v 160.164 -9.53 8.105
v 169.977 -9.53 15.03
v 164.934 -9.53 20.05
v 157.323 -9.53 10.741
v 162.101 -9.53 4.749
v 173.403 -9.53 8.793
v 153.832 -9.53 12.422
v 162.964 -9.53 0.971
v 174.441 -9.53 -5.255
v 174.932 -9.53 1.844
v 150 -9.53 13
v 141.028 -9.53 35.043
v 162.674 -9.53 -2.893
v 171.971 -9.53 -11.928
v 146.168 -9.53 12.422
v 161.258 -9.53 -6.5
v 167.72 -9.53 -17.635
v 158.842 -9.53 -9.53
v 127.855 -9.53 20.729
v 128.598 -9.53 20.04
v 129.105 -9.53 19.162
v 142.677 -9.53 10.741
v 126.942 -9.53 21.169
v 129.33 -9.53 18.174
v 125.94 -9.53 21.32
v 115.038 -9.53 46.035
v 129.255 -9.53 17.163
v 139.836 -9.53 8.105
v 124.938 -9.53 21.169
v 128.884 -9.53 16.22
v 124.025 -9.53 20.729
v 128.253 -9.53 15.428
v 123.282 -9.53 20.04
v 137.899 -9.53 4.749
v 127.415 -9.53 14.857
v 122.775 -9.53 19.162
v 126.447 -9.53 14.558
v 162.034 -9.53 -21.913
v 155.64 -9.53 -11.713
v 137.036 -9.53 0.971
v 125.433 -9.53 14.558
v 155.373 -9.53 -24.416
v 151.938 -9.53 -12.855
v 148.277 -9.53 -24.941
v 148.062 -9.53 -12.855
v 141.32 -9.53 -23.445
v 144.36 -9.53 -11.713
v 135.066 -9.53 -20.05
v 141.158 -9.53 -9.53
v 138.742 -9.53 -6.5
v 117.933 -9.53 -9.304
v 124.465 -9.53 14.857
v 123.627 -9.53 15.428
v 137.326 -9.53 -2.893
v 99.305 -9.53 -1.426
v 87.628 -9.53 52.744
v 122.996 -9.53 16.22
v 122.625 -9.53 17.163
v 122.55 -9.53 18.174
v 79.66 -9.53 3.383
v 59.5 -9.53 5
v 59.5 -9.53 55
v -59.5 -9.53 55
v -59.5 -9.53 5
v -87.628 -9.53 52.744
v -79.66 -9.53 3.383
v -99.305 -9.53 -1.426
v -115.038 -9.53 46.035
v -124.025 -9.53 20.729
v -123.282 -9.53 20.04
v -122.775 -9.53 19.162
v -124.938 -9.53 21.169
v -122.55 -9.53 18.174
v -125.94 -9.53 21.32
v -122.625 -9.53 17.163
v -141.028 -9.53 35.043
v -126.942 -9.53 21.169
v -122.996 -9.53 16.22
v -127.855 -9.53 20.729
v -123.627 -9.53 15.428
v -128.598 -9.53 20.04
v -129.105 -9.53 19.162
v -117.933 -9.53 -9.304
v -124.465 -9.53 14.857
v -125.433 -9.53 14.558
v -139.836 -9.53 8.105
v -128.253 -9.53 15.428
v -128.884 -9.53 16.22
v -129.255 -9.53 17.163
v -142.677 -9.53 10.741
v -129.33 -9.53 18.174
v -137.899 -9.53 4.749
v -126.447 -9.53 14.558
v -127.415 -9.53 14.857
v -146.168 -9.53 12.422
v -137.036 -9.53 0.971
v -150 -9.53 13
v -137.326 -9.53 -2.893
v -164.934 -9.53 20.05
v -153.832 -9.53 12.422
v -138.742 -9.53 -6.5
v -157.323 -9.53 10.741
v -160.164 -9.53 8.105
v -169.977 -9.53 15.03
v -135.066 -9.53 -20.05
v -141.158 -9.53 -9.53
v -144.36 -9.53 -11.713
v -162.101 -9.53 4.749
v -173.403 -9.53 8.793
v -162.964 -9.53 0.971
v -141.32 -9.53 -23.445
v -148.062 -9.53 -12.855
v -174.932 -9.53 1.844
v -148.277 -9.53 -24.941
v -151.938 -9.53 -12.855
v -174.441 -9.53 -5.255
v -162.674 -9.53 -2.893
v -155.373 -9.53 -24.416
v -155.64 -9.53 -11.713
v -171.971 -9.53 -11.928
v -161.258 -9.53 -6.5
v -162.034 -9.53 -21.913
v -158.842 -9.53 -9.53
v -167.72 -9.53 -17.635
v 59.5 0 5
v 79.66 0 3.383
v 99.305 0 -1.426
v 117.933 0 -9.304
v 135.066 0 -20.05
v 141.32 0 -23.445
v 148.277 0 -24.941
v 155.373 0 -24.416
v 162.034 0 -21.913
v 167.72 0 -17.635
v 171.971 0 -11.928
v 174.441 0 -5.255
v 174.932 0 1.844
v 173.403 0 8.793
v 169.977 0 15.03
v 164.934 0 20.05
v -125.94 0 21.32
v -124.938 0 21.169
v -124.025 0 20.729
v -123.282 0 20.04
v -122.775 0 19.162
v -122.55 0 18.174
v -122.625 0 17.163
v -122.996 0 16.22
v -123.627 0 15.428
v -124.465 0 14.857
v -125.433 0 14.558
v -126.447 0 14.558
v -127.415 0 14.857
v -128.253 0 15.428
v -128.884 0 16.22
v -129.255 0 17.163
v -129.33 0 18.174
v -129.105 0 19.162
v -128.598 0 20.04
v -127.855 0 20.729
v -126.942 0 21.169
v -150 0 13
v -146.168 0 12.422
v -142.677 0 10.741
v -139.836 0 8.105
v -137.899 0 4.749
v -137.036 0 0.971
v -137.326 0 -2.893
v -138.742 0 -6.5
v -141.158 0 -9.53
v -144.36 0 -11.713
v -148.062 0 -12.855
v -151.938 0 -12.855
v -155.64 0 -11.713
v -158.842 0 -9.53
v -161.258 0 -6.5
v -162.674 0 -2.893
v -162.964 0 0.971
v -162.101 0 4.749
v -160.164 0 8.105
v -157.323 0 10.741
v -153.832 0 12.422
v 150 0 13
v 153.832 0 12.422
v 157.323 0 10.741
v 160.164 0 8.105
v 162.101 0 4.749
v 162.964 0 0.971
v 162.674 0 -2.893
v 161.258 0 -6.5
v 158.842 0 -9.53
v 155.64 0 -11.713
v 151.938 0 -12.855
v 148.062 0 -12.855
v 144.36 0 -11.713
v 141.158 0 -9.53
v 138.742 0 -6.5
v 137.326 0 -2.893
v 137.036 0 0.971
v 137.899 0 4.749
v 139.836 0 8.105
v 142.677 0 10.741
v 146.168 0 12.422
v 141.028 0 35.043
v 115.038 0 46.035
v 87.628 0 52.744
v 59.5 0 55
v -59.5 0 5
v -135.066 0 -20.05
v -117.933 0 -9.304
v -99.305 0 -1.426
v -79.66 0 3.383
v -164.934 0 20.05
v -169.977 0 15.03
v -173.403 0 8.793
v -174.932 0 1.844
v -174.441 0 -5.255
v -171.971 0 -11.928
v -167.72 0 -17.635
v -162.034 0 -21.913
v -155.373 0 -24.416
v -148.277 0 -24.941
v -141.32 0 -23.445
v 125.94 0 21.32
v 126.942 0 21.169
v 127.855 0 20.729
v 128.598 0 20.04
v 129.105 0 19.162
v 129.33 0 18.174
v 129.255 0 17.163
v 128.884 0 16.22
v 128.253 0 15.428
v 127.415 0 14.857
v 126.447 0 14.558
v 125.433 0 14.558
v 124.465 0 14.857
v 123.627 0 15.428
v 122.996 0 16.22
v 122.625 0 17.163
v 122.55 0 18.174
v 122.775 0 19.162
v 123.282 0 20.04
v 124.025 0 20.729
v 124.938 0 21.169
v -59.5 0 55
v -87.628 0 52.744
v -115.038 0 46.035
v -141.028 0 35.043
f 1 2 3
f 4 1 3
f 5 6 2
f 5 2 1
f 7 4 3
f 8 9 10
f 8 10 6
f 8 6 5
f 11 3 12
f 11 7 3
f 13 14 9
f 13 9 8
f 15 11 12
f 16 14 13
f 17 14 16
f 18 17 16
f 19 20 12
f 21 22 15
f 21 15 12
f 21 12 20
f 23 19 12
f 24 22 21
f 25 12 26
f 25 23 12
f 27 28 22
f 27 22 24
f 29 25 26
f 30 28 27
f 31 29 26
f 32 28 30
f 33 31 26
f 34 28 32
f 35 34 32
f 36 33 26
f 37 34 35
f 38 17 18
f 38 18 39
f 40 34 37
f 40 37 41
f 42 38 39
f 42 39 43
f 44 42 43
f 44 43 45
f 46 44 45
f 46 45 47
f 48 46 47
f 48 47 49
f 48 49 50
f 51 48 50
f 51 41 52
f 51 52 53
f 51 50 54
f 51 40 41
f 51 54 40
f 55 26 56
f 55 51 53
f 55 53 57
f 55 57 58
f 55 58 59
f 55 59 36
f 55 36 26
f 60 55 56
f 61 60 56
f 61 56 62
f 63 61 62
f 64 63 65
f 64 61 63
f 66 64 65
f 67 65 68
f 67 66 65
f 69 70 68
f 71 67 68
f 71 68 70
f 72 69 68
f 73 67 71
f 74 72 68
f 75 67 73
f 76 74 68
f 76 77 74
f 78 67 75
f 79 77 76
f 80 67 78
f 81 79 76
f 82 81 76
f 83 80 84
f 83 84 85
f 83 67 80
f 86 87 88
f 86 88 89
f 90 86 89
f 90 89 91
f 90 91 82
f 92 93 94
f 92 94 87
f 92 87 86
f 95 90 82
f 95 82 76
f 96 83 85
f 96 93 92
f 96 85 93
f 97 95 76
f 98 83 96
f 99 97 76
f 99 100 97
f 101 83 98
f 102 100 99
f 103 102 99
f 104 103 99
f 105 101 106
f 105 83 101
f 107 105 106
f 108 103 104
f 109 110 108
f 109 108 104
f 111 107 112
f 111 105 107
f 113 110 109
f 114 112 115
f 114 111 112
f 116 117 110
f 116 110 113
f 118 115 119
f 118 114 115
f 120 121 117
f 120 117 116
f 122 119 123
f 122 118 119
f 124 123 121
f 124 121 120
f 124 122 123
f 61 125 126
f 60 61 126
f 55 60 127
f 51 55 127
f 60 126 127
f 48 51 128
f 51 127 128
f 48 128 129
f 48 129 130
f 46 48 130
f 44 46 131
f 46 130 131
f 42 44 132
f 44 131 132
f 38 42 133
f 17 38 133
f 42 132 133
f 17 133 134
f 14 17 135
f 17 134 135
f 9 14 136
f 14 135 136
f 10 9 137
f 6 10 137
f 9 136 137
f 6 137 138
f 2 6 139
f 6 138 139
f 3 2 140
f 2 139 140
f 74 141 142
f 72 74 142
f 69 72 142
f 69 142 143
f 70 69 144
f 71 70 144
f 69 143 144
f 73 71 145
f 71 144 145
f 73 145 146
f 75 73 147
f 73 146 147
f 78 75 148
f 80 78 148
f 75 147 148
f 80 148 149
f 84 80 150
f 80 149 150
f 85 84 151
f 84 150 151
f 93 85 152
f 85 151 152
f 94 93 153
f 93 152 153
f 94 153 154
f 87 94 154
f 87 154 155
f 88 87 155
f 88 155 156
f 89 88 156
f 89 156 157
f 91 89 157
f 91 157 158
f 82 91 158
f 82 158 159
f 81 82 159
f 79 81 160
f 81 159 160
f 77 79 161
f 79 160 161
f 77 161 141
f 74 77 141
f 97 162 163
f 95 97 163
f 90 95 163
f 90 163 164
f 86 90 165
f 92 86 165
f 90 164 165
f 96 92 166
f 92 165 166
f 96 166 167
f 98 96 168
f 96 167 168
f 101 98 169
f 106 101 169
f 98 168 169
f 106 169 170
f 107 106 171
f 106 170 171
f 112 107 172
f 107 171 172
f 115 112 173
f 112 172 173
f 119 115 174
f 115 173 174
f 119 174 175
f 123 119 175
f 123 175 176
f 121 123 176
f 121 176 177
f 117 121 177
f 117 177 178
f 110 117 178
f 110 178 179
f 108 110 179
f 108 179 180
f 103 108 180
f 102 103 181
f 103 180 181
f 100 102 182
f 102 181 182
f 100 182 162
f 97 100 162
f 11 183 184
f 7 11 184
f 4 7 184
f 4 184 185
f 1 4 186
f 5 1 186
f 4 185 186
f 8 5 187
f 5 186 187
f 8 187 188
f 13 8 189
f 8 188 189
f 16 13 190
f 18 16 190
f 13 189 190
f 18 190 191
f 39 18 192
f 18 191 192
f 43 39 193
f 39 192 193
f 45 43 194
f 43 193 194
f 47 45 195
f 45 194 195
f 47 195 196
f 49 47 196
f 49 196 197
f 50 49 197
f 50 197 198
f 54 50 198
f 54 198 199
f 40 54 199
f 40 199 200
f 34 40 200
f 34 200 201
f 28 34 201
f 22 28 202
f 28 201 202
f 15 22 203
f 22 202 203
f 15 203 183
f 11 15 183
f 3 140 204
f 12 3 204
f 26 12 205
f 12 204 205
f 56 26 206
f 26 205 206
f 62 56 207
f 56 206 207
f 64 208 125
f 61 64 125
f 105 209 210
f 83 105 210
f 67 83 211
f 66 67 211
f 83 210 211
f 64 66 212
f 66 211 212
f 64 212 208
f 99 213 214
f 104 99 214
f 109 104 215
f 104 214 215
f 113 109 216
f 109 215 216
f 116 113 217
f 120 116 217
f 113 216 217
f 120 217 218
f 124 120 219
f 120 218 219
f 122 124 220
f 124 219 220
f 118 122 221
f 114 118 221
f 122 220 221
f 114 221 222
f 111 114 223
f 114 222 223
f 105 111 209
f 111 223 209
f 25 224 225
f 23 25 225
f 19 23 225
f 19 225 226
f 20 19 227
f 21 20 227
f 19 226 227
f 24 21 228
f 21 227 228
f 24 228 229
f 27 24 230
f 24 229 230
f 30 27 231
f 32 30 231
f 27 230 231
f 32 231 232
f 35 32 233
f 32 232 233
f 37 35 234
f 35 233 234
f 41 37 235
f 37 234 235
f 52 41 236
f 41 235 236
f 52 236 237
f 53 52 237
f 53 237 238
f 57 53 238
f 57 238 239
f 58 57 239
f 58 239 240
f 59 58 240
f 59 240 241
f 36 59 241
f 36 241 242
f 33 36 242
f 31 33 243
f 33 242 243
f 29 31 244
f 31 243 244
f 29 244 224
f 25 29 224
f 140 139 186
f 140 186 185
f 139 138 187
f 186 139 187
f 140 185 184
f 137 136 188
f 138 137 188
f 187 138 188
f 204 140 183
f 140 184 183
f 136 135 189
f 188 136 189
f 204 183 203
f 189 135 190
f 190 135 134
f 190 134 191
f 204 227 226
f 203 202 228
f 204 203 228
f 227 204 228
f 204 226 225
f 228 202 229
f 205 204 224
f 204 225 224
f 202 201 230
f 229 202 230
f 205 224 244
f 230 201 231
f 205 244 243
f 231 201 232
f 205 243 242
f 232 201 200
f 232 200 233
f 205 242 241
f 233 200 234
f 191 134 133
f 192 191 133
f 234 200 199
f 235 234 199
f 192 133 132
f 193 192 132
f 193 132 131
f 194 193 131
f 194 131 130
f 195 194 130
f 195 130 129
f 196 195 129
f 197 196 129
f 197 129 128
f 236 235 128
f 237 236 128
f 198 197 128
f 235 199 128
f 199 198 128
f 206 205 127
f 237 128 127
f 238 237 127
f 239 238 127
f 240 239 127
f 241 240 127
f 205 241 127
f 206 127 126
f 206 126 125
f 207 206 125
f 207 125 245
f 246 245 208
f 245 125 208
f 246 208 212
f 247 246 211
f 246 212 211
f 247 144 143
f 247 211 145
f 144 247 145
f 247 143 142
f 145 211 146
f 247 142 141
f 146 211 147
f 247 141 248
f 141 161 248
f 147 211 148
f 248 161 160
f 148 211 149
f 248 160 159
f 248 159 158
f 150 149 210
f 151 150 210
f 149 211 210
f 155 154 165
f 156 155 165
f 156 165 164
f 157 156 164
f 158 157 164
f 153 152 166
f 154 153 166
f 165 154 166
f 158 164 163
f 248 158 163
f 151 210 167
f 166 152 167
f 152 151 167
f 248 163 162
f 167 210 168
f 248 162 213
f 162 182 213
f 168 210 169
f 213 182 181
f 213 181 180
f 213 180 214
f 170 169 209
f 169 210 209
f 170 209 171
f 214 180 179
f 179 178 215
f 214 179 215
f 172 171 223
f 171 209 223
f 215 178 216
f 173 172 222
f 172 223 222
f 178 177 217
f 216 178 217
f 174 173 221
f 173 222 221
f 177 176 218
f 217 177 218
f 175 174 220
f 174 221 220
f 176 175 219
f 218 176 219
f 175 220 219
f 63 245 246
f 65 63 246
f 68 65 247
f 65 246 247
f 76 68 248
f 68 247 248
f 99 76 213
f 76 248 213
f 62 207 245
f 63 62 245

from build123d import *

# Parameters (mm, degrees)
ESBO_O1_R          = 13
ESBO_O1_R_2        = 3.4
FLANGE_BASE1_DEPTH = 9.53


# Sheet-metal steps are written as plain solids
with BuildPart() as part:
    # Esboço1 → Flange-base1 (new body)
    with BuildSketch(Plane(origin=(0, 0, 0), x_dir=(1, 0, 0), z_dir=(0, 1, 0))):
        with BuildLine():
            Line((-59.5, -5), (59.5, -5))
            ThreePointArc((59.5, -5), (99.305049758, 1.425599896), (135.066417315, 20.049641099))
            ThreePointArc((135.066417315, 20.049641099), (170.049641099, 14.933582685), (164.933582685, -20.049641099))
            ThreePointArc((164.933582685, -20.049641099), (115.037752802, -46.034720952), (59.5, -55))
            Line((59.5, -55), (-59.5, -55))
            ThreePointArc((-59.5, -55), (-115.037752802, -46.034720952), (-164.933582685, -20.049641099))
            ThreePointArc((-164.933582685, -20.049641099), (-170.049641099, 14.933582685), (-135.066417315, 20.049641099))
            ThreePointArc((-135.066417315, 20.049641099), (-99.305049758, 1.425599896), (-59.5, -5))
        make_face()
        with Locations(Location((-150, 0, 0), (0, 0, 270))):
            Circle(ESBO_O1_R, mode=Mode.SUBTRACT)
        with Locations(Location((150, 0, 0), (0, 0, 270))):
            Circle(ESBO_O1_R, mode=Mode.SUBTRACT)
        with Locations(Location((-125.94, -17.92, 0), (0, 0, 270))):
            Circle(ESBO_O1_R_2, mode=Mode.SUBTRACT)
        with Locations(Location((125.94, -17.92, 0), (0, 0, 270))):
            Circle(ESBO_O1_R_2, mode=Mode.SUBTRACT)
    extrude(amount=-FLANGE_BASE1_DEPTH)


solid = part.part
